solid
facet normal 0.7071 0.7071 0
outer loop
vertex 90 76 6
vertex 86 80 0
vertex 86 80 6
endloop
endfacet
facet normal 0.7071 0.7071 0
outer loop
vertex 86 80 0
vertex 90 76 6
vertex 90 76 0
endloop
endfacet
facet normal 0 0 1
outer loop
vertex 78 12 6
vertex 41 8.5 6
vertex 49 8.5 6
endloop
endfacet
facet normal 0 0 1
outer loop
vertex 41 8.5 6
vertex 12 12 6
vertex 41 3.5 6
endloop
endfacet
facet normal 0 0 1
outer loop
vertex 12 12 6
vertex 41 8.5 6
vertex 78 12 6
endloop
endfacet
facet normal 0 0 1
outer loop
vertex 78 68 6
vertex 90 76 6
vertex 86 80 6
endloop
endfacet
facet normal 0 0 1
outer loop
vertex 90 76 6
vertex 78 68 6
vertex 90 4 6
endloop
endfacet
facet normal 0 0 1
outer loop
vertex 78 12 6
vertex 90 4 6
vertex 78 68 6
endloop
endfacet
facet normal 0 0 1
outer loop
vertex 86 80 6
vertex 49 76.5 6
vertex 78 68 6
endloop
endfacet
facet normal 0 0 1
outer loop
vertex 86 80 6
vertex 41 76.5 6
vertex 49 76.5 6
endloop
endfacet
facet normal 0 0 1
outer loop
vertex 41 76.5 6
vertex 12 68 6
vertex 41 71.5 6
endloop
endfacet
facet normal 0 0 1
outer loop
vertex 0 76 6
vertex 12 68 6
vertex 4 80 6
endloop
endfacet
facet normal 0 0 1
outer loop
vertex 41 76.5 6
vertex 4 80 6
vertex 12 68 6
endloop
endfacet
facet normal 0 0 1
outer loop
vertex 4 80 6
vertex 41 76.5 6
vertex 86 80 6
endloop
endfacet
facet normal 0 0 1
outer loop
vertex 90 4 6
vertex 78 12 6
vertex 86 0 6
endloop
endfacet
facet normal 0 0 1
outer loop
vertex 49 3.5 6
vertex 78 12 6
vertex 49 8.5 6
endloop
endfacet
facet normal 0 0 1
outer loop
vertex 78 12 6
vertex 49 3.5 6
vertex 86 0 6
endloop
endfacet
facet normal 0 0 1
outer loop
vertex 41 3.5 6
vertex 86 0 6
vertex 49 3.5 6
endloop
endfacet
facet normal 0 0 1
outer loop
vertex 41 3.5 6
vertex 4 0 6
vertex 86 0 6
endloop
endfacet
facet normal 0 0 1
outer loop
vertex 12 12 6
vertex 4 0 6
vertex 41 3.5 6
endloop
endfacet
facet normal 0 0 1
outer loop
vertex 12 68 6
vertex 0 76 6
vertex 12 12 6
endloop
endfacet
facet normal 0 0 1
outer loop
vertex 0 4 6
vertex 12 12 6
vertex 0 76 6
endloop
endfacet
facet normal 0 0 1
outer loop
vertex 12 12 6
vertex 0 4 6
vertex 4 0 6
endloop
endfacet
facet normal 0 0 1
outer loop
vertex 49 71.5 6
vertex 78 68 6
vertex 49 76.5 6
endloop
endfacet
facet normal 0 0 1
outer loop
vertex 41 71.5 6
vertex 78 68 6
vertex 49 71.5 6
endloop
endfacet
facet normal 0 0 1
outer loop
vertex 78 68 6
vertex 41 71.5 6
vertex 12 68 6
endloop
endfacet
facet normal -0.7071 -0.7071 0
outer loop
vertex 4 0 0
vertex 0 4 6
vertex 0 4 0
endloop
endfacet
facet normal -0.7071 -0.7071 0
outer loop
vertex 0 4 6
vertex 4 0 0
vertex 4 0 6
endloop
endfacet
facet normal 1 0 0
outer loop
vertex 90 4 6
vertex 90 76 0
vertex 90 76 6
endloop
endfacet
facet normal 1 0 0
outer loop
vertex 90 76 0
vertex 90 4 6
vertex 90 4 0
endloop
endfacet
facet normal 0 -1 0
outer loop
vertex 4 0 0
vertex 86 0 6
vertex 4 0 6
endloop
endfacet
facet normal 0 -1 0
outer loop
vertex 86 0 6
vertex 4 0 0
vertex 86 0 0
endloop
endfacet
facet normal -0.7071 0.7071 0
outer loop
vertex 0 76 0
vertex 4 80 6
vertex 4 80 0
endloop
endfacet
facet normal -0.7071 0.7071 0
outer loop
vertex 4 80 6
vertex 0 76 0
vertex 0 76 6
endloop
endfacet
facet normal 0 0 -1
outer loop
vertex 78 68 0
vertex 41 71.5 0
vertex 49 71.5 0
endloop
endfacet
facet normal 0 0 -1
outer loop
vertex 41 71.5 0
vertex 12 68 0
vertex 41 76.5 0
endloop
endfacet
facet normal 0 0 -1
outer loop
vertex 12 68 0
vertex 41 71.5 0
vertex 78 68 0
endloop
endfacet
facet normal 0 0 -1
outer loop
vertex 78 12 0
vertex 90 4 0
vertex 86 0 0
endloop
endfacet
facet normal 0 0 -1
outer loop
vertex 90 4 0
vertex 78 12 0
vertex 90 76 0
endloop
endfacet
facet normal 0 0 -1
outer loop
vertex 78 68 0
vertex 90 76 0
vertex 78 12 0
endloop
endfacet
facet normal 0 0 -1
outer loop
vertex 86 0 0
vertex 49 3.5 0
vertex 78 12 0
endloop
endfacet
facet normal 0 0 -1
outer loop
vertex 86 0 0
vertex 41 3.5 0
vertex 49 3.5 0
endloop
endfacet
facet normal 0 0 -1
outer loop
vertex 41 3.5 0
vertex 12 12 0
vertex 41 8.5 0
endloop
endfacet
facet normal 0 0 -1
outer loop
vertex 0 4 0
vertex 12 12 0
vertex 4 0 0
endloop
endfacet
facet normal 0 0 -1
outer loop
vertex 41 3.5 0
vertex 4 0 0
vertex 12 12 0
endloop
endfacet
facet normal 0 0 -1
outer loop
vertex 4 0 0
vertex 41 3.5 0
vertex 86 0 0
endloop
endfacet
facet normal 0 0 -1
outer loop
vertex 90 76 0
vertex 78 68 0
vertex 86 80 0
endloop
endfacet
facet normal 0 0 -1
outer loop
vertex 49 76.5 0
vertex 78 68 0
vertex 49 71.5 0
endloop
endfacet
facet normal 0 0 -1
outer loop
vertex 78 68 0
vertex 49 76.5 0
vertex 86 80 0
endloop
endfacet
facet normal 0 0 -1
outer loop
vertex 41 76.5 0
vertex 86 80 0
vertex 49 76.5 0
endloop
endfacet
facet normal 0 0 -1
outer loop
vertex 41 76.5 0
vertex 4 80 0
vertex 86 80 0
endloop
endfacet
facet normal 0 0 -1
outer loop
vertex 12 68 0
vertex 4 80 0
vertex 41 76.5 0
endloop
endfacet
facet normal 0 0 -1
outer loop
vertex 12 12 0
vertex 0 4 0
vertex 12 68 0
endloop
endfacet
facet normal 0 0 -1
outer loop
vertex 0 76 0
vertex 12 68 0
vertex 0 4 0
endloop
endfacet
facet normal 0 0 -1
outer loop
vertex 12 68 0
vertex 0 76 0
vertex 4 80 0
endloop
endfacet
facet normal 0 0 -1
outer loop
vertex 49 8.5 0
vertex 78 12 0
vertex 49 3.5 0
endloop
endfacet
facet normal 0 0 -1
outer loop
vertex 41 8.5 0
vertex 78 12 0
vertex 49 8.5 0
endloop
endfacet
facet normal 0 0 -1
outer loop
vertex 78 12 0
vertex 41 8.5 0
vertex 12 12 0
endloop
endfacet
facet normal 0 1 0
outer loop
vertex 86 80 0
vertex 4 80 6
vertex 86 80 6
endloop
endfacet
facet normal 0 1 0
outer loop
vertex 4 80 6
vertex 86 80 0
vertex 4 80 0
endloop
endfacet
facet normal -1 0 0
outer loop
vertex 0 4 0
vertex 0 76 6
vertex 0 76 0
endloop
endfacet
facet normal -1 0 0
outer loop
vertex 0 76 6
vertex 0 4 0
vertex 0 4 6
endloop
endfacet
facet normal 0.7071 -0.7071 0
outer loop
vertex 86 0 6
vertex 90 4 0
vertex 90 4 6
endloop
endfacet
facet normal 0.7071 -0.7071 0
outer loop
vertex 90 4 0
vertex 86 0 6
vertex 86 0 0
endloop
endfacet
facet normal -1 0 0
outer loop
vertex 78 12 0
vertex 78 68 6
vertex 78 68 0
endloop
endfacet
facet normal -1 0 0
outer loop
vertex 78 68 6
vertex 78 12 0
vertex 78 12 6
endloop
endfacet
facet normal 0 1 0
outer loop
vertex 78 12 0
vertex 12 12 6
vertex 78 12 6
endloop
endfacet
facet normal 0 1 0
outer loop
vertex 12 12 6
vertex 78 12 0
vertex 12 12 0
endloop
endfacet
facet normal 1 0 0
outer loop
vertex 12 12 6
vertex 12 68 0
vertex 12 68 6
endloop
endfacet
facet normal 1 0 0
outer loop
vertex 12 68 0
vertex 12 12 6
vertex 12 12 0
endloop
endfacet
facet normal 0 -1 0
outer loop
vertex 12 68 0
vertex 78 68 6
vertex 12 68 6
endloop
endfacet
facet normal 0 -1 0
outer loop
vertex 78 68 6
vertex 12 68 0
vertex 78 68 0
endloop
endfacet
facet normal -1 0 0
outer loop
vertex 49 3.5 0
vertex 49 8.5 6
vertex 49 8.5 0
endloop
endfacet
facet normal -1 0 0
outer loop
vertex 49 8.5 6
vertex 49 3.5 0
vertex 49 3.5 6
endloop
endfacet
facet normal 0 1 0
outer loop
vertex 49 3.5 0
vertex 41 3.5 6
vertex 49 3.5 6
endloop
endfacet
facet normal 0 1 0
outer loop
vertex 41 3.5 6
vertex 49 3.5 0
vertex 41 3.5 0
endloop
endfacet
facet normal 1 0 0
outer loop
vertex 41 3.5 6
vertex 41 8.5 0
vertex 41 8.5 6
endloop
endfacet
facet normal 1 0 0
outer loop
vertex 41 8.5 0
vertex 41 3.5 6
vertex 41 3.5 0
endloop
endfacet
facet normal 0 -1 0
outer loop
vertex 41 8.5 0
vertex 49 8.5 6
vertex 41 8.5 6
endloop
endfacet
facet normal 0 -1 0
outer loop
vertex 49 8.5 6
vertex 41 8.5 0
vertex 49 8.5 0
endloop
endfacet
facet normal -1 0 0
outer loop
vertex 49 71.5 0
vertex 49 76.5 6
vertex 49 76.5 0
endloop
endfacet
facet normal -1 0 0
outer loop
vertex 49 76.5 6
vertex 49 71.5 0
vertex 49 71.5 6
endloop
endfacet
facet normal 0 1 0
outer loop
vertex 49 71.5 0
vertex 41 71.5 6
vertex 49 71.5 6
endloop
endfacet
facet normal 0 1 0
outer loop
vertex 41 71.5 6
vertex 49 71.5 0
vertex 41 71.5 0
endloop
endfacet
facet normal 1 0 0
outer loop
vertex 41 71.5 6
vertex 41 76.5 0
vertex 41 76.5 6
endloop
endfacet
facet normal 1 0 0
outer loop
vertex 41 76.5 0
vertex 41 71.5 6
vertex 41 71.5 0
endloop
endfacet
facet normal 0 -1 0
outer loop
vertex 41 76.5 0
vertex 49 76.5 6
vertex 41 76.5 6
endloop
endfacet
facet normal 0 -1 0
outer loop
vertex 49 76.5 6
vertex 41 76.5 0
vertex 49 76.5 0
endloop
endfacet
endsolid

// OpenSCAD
$fn = 32;

// ----------------------------------------------------------------------
// Frame plate: 90 x 80 frame, 12 mm rails
// ----------------------------------------------------------------------

// --- parameters (mm) ---
plate_l = 90;             // plate length, X
plate_w = 80;             // plate width, Y
plate_t = 6;              // plate thickness, Z (extrusion height)
corner_c = 4;             // corner chamfer
frame_bar = 12;           // frame rail width
slot_l = 8;               // adjustment slot length
slot_w = 5;               // adjustment slot width

win_l = plate_l - 2 * frame_bar;  // window length
win_w = plate_w - 2 * frame_bar;  // window width

profile = [[4, 0], [86, 0], [90, 4], [90, 76], [86, 80], [4, 80], [0, 76], [0, 4]];  // primary outline, 8 points, counter clockwise
void_1 = [[12, 12], [78, 12], [78, 68], [12, 68]];  // the window, 4 points
void_2 = [[41, 3.5], [49, 3.5], [49, 8.5], [41, 8.5]];  // adjustment slot, 4 points
void_3 = [[41, 71.5], [49, 71.5], [49, 76.5], [41, 76.5]];  // adjustment slot, 4 points

// --- the one profile operation ---
difference() {
  linear_extrude(height = plate_t) polygon(points = profile);
  translate([0, 0, -1])
    linear_extrude(height = plate_t + 2) polygon(points = void_1);
  translate([0, 0, -1])
    linear_extrude(height = plate_t + 2) polygon(points = void_2);
  translate([0, 0, -1])
    linear_extrude(height = plate_t + 2) polygon(points = void_3);
}
